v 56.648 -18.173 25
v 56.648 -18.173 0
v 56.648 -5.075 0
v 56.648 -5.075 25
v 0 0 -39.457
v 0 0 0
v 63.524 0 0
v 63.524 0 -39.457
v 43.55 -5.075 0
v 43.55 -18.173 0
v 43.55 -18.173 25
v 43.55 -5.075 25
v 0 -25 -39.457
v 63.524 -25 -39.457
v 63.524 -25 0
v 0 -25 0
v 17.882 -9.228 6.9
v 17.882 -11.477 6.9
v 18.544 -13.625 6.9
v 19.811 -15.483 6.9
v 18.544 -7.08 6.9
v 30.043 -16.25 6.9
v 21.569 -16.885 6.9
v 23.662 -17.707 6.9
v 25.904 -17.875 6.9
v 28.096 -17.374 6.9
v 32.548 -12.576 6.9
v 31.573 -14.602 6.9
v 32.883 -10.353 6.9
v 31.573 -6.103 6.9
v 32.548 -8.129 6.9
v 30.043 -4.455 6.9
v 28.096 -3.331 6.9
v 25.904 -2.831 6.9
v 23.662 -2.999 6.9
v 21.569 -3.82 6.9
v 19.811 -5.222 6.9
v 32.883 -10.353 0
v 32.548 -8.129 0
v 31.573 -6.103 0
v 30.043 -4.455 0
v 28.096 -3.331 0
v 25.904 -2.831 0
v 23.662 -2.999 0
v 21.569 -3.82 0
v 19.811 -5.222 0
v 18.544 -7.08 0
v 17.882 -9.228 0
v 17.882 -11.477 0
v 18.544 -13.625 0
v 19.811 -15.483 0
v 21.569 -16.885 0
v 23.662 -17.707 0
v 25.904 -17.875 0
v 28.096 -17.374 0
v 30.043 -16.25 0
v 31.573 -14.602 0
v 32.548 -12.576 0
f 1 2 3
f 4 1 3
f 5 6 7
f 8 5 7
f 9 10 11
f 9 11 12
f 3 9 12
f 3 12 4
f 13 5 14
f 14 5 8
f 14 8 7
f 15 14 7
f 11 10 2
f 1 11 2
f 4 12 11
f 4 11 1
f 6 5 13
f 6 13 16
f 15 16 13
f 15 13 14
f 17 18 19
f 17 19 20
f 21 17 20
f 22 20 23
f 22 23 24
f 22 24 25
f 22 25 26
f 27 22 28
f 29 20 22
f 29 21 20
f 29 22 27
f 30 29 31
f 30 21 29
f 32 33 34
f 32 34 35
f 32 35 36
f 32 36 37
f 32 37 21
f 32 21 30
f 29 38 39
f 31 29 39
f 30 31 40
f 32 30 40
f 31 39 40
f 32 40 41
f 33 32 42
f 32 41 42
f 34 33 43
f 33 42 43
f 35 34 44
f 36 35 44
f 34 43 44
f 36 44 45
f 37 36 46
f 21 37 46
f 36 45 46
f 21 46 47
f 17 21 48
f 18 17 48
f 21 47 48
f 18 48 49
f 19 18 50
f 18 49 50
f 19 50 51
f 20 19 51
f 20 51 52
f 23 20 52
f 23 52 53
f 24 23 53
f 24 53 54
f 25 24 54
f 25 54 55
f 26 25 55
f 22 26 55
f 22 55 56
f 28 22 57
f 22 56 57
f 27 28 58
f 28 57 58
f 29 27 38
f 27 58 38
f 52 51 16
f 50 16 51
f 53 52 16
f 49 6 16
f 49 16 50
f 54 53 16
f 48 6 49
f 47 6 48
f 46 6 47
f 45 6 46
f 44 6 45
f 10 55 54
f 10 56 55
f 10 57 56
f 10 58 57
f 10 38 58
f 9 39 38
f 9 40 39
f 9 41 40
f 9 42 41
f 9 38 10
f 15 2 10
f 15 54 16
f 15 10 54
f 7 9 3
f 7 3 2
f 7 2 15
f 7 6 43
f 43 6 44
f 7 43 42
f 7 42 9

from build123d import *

# Parameters (mm, degrees)
F0_W     = 63.523911
F0_H     = 39.456863
F1_DEPTH = 25
F2_R     = 7.543039
F3_DEPTH = 6.9
F4_W     = 13.097714
F4_H     = 13.097714
F5_DEPTH = 25


with BuildPart() as f1:
    # F0 (on Front) → F1 (new body)
    with BuildSketch(Plane.XZ):
        with Locations((31.761955, -19.728431)):
            Rectangle(F0_W, F0_H)
    extrude(amount=F1_DEPTH)

    # F2 (on face) → F3 (join)
    with BuildSketch(Plane.XY):
        with Locations((25.3403, -10.352623)):
            Circle(F2_R)
    extrude(amount=F3_DEPTH)

    # F4 (on face) → F5 (join)
    with BuildSketch(Plane.XY):
        with Locations((50.098749, -11.624221)):
            Rectangle(F4_W, F4_H)
    extrude(amount=F5_DEPTH)


solid = f1.part
